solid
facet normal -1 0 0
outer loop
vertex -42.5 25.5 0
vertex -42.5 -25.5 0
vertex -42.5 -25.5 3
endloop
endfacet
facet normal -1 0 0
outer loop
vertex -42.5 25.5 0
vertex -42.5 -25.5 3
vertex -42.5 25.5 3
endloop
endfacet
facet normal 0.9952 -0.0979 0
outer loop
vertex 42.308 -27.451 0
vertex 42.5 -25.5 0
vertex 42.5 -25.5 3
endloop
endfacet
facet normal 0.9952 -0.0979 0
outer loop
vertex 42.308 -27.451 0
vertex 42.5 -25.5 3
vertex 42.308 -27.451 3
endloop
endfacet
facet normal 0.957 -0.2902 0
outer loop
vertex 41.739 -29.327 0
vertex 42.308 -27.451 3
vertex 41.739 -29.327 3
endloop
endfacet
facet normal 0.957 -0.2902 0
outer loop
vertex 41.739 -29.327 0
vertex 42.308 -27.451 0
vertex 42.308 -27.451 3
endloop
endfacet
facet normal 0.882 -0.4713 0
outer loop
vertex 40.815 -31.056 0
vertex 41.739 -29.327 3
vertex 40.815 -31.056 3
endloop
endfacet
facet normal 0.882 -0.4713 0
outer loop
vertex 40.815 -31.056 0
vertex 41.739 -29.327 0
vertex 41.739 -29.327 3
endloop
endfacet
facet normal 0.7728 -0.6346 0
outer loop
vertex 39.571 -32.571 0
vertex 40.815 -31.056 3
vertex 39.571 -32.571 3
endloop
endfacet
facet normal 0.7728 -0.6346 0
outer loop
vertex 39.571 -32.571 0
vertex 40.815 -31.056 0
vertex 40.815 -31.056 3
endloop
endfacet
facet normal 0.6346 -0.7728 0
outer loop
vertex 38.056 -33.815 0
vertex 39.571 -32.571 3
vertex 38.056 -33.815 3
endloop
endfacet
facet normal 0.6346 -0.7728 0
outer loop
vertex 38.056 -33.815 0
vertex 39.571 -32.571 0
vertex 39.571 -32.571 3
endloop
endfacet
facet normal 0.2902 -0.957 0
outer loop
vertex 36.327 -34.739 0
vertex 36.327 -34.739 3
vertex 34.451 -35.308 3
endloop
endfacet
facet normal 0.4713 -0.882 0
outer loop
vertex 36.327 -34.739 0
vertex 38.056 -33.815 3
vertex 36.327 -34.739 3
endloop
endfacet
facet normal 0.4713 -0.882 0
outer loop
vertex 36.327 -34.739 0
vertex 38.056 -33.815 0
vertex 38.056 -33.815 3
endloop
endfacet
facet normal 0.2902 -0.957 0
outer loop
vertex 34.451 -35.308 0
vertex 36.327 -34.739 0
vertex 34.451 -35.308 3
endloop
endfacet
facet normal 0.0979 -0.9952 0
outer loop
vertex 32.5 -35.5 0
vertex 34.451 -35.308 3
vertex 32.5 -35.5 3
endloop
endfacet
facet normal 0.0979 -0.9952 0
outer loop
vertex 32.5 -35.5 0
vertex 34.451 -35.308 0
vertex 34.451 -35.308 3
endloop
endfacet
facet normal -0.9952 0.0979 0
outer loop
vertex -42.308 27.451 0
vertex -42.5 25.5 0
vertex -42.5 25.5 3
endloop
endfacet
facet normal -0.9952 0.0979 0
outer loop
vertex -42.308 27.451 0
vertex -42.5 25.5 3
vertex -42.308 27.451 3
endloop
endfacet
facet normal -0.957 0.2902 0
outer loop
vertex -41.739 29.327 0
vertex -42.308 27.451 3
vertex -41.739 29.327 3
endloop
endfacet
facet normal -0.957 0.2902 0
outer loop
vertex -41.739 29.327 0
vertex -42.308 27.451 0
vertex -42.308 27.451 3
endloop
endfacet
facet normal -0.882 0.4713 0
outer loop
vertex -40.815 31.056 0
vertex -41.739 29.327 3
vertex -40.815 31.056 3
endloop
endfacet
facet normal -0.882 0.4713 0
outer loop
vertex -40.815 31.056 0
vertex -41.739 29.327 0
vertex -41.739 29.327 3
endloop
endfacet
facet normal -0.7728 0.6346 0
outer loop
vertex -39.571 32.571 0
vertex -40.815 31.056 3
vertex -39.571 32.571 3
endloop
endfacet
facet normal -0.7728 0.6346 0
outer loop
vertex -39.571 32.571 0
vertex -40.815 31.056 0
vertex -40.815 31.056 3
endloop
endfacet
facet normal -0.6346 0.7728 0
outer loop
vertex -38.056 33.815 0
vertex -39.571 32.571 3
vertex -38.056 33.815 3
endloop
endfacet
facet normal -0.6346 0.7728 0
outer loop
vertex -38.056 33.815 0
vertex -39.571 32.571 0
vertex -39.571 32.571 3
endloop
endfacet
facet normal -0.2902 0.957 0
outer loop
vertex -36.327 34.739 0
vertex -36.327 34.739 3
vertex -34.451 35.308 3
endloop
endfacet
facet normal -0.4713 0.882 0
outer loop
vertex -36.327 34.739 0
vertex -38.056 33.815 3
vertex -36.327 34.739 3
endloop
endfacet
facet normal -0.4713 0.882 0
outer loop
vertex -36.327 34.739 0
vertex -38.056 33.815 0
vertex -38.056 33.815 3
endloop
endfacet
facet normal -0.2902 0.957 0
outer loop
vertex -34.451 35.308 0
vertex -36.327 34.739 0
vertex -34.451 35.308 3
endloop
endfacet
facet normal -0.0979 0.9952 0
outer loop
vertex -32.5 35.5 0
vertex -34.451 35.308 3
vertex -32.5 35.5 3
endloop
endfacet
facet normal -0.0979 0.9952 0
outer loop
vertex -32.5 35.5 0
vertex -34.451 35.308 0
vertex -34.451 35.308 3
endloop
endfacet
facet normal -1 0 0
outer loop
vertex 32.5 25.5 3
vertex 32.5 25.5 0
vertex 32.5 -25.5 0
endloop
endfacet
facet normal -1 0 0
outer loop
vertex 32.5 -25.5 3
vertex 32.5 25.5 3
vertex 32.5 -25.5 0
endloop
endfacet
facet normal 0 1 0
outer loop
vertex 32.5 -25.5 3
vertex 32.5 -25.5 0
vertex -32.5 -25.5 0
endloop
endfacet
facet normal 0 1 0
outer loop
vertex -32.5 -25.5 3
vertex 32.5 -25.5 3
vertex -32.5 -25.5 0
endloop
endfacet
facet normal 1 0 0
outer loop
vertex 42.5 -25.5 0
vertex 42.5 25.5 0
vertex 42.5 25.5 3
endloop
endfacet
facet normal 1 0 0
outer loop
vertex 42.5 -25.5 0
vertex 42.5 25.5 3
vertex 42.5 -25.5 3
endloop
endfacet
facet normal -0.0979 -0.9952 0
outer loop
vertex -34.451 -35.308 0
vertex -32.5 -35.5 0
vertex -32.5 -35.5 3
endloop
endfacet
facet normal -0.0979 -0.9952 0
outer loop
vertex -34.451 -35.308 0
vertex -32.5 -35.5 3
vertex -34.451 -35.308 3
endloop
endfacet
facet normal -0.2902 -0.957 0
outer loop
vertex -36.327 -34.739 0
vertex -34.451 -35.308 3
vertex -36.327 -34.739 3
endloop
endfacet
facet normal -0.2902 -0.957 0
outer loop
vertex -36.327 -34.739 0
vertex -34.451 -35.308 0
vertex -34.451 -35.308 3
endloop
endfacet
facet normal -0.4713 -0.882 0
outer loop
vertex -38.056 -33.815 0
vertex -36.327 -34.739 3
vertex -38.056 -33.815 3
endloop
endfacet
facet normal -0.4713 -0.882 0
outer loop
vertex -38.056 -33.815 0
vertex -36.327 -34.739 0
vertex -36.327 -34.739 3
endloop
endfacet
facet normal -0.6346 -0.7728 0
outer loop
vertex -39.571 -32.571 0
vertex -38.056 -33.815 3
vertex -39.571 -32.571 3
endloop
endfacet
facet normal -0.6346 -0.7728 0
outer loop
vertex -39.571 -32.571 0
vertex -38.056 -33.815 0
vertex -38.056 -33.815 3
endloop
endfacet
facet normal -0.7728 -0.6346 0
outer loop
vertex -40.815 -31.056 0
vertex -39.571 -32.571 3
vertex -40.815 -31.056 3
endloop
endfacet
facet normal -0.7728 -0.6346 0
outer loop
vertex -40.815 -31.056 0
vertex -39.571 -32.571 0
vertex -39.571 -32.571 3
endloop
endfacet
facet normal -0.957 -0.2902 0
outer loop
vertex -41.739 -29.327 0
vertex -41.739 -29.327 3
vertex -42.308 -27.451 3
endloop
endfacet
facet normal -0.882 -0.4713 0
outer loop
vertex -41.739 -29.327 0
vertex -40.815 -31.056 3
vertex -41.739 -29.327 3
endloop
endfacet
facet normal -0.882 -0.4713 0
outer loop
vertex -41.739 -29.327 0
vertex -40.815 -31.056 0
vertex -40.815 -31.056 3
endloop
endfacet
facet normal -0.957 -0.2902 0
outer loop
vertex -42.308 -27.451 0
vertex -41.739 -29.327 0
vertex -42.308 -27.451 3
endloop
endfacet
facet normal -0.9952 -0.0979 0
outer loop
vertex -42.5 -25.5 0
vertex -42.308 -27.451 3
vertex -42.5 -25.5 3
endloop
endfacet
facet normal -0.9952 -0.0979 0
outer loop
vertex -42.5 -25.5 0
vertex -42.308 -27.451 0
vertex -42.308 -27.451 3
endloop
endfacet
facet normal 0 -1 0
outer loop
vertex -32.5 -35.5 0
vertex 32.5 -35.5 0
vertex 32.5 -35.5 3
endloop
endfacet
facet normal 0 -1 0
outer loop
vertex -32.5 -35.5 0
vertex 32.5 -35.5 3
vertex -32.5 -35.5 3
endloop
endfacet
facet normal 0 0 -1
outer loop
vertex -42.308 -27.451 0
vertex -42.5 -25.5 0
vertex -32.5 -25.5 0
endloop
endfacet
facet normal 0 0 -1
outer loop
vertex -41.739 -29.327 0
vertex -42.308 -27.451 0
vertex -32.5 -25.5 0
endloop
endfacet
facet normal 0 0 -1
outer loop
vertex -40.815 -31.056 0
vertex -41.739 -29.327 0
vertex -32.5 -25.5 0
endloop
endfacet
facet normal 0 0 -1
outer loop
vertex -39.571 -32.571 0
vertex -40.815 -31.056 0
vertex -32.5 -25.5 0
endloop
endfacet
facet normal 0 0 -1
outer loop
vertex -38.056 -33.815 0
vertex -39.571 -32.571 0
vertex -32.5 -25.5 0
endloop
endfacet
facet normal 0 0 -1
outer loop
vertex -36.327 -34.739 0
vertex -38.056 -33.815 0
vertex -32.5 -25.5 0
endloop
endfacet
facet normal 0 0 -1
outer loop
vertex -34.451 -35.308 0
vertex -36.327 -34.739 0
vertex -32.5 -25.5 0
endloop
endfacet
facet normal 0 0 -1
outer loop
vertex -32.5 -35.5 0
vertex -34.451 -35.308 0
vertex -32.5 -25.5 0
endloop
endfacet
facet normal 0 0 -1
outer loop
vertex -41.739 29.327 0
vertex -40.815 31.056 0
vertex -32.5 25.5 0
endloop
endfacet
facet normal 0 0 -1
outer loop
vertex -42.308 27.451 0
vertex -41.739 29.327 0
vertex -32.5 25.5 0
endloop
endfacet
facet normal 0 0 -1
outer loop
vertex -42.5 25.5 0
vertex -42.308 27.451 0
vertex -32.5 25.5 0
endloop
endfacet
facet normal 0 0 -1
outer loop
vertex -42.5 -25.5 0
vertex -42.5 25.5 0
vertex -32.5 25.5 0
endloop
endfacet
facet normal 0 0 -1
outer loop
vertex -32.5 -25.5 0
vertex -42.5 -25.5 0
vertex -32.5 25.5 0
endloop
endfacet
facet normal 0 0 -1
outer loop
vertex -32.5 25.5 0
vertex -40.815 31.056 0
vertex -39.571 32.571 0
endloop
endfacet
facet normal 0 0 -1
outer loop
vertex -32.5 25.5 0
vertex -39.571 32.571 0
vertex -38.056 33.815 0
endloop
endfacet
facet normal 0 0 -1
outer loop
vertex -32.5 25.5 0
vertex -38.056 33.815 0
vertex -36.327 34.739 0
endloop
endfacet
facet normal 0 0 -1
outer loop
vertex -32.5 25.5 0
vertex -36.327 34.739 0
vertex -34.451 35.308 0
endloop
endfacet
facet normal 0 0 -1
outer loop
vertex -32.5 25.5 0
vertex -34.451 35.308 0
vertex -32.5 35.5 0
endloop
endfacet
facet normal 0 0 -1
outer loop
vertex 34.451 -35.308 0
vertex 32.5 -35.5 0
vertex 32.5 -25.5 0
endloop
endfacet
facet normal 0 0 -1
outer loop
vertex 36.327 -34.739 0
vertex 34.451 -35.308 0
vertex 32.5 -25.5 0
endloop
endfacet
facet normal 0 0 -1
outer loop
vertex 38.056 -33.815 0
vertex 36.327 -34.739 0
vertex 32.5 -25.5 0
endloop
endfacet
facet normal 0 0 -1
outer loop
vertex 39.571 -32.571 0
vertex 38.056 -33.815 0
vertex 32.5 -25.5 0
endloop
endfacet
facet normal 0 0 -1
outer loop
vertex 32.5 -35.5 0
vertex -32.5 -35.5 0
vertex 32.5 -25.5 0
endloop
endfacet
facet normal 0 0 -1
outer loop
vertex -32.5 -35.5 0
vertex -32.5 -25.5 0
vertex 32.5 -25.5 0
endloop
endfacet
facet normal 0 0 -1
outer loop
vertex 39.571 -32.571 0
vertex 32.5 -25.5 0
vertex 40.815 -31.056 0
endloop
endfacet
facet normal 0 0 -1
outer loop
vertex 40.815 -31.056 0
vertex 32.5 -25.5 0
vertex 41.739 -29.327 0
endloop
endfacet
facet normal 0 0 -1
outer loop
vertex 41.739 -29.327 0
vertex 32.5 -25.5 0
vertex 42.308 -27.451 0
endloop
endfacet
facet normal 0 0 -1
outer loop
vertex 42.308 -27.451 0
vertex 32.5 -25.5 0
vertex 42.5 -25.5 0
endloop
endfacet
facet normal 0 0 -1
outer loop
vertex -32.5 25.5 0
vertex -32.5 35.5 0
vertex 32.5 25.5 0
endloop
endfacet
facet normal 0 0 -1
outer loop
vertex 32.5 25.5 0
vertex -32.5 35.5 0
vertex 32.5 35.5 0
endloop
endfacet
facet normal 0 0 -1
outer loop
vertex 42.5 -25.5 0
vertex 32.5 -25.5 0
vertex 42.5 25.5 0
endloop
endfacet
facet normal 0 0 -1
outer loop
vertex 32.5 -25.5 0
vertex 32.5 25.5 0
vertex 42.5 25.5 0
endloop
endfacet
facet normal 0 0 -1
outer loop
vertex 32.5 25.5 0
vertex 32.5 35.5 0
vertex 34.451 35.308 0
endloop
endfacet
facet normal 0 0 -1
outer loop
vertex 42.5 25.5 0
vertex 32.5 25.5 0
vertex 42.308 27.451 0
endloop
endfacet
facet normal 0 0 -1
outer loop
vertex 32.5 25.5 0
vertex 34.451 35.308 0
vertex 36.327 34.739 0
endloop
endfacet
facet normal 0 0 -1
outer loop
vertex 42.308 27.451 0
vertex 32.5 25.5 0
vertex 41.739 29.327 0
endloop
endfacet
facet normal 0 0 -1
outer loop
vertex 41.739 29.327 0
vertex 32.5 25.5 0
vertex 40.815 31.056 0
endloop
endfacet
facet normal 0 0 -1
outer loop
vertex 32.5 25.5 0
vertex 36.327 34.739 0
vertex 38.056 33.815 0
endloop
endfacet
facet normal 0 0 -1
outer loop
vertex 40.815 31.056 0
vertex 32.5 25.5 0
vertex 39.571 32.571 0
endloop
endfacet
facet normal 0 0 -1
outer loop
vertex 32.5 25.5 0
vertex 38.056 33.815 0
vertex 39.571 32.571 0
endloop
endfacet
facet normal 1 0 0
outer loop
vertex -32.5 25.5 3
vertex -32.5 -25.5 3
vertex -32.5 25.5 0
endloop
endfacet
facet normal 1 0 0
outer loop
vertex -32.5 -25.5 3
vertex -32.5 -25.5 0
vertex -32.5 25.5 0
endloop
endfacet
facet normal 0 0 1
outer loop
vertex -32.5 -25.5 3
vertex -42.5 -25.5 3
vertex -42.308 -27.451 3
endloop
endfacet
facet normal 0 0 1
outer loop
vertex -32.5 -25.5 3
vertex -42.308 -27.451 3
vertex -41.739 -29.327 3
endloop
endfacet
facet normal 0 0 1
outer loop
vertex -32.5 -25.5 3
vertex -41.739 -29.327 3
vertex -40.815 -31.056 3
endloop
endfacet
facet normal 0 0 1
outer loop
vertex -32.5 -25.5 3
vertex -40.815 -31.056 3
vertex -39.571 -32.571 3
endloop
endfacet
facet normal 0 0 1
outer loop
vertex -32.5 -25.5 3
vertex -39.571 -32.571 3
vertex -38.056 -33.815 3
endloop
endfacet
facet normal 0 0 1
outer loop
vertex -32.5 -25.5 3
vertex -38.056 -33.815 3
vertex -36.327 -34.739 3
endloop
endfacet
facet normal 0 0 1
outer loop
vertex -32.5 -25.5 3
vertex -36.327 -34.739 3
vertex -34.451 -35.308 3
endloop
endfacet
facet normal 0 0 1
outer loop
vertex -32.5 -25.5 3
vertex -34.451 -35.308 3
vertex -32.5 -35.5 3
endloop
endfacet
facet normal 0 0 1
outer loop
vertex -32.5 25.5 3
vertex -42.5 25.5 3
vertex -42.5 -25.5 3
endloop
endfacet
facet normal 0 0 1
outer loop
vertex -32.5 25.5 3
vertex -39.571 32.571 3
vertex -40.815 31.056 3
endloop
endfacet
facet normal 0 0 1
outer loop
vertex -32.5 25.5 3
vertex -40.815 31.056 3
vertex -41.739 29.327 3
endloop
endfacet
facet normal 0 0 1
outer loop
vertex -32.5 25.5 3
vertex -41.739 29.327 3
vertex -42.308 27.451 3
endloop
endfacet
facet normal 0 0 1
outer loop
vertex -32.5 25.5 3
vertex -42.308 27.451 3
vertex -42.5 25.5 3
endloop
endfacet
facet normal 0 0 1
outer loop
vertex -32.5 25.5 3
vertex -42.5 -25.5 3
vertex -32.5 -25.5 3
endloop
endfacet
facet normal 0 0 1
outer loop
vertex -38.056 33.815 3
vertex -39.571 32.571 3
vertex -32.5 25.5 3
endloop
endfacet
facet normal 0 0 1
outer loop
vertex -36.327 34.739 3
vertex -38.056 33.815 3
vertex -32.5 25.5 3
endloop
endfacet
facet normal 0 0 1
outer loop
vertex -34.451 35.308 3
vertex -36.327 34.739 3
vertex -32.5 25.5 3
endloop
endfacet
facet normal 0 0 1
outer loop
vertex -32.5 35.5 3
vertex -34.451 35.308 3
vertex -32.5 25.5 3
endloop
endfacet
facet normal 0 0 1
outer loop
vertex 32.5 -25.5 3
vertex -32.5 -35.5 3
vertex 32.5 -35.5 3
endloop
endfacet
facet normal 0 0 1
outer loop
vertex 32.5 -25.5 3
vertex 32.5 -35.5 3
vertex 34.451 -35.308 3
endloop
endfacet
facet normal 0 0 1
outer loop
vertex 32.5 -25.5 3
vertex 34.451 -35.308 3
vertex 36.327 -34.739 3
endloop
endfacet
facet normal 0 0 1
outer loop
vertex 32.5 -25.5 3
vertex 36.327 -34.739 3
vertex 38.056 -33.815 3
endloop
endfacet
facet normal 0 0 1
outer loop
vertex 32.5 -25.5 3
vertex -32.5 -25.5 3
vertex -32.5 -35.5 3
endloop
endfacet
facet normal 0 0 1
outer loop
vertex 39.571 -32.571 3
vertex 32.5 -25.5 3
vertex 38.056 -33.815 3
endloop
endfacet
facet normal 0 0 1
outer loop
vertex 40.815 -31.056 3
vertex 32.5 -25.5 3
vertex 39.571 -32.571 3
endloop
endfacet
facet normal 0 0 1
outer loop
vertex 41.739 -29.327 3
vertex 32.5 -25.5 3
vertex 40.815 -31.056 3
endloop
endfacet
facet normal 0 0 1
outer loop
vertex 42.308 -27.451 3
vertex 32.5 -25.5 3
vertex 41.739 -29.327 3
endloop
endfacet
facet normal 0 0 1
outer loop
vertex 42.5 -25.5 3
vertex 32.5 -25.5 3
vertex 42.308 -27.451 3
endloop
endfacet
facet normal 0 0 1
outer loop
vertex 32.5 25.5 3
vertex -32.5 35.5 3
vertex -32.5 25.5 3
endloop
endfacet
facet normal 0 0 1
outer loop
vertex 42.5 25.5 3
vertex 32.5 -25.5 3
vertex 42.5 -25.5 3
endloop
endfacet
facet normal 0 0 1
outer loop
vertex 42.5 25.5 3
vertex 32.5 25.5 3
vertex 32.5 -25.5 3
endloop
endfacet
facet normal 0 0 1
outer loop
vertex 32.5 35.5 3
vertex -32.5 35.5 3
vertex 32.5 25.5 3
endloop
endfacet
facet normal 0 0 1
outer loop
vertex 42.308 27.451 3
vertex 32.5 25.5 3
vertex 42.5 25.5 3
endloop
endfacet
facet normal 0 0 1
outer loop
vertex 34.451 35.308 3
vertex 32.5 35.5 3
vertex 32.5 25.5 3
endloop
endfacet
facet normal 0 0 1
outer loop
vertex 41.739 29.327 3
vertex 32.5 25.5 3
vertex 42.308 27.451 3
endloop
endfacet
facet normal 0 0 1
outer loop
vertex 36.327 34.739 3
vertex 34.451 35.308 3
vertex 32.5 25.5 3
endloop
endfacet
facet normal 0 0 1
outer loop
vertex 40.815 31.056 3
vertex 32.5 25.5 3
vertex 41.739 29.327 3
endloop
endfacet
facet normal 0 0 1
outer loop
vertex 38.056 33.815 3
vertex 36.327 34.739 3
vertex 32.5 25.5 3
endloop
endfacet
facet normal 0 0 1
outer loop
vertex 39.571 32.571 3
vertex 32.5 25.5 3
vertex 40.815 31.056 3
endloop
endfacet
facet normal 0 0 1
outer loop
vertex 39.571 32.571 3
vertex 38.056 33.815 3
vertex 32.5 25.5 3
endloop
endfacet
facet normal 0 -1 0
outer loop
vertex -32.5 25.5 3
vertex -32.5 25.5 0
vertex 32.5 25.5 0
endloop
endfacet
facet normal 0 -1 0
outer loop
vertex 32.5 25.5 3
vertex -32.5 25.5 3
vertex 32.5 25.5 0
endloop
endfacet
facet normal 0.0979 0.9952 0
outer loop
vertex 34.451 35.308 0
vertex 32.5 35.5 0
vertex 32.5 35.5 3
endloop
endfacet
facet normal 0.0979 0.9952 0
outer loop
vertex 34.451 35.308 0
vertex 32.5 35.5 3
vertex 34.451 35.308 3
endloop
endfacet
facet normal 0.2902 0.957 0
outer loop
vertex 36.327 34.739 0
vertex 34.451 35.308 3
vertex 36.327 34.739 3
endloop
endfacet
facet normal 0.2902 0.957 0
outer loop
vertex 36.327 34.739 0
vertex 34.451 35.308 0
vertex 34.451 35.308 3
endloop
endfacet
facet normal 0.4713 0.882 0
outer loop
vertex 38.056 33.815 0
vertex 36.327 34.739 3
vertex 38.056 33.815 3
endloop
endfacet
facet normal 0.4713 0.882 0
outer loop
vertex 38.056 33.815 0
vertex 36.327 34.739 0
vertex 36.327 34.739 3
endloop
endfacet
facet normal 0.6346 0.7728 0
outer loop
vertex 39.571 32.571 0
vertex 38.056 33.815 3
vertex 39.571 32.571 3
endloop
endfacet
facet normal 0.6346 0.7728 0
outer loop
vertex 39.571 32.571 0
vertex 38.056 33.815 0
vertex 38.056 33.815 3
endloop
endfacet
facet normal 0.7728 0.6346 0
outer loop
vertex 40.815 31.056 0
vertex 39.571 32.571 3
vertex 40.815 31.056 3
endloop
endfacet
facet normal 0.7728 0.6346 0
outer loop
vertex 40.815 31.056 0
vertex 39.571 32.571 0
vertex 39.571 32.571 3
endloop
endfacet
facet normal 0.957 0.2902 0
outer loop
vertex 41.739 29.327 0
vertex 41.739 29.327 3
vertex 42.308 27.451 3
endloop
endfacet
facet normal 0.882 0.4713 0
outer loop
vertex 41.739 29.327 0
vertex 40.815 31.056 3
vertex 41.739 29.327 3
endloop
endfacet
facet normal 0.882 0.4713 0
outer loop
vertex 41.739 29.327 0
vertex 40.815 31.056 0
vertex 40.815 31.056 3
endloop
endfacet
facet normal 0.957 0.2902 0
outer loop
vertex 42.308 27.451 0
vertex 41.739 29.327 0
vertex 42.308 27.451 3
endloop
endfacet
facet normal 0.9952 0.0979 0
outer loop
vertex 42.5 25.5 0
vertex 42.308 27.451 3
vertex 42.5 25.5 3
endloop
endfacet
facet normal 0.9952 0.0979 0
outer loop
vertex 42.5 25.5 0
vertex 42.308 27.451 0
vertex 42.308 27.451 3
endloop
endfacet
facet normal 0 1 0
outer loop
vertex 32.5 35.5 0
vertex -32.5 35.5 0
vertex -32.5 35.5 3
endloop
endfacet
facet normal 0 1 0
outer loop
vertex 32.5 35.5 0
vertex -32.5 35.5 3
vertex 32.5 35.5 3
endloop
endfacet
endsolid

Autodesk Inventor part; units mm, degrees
ref_plane "YZ Plane" through (0, 0, 0) normal (1, 0, 0) x (0, 1, 0)
ref_plane "XZ Plane" through (0, 0, 0) normal (0, 1, 0) x (-1, 0, 0)
ref_plane "XY Plane" through (0, 0, 0) normal (0, 0, 1) x (1, 0, 0)
sketch "Sketch1" plane through (0, 0, 0) normal (0, 0, 1) x (1, 0, 0)
  line L0 (-32.5, 25.5) -> (32.5, 25.5)
  line L1 (32.5, 25.5) -> (32.5, -25.5)
  line L2 (32.5, -25.5) -> (-32.5, -25.5)
  line L3 (-32.5, -25.5) -> (-32.5, 25.5)
  line L4 (-32.5, 35.5) -> (32.5, 35.5)
  line L5 (42.5, 25.5) -> (42.5, -25.5)
  line L6 (32.5, -35.5) -> (-32.5, -35.5)
  line L7 (-42.5, -25.5) -> (-42.5, 25.5)
  arc A0 (-32.5, 35.5) -> (-42.5, 25.5) centre (-32.5, 25.5) ccw
  arc A1 (-42.5, -25.5) -> (-32.5, -35.5) centre (-32.5, -25.5) ccw
  arc A2 (32.5, -35.5) -> (42.5, -25.5) centre (32.5, -25.5) ccw
  arc A3 (42.5, 25.5) -> (32.5, 35.5) centre (32.5, 25.5) ccw
  point P0 (0, 0)
  point P1 (0, 25.5)
  point P2 (32.5, 0)
  point P3 (42.5, 0)
  point P4 (0, 35.5)
  dimension "d0" = 65
  dimension "d1" = 51
  dimension "d2" = 10
  dimension "d3" = 10
  dimension "d4" = 10
extrude "Extrusion1" add sketch "Sketch1" along normal blind 3
equation "\"d4\" = d3"
properties part number "Front_stopper2" material "Polycarbonate, Clear"
